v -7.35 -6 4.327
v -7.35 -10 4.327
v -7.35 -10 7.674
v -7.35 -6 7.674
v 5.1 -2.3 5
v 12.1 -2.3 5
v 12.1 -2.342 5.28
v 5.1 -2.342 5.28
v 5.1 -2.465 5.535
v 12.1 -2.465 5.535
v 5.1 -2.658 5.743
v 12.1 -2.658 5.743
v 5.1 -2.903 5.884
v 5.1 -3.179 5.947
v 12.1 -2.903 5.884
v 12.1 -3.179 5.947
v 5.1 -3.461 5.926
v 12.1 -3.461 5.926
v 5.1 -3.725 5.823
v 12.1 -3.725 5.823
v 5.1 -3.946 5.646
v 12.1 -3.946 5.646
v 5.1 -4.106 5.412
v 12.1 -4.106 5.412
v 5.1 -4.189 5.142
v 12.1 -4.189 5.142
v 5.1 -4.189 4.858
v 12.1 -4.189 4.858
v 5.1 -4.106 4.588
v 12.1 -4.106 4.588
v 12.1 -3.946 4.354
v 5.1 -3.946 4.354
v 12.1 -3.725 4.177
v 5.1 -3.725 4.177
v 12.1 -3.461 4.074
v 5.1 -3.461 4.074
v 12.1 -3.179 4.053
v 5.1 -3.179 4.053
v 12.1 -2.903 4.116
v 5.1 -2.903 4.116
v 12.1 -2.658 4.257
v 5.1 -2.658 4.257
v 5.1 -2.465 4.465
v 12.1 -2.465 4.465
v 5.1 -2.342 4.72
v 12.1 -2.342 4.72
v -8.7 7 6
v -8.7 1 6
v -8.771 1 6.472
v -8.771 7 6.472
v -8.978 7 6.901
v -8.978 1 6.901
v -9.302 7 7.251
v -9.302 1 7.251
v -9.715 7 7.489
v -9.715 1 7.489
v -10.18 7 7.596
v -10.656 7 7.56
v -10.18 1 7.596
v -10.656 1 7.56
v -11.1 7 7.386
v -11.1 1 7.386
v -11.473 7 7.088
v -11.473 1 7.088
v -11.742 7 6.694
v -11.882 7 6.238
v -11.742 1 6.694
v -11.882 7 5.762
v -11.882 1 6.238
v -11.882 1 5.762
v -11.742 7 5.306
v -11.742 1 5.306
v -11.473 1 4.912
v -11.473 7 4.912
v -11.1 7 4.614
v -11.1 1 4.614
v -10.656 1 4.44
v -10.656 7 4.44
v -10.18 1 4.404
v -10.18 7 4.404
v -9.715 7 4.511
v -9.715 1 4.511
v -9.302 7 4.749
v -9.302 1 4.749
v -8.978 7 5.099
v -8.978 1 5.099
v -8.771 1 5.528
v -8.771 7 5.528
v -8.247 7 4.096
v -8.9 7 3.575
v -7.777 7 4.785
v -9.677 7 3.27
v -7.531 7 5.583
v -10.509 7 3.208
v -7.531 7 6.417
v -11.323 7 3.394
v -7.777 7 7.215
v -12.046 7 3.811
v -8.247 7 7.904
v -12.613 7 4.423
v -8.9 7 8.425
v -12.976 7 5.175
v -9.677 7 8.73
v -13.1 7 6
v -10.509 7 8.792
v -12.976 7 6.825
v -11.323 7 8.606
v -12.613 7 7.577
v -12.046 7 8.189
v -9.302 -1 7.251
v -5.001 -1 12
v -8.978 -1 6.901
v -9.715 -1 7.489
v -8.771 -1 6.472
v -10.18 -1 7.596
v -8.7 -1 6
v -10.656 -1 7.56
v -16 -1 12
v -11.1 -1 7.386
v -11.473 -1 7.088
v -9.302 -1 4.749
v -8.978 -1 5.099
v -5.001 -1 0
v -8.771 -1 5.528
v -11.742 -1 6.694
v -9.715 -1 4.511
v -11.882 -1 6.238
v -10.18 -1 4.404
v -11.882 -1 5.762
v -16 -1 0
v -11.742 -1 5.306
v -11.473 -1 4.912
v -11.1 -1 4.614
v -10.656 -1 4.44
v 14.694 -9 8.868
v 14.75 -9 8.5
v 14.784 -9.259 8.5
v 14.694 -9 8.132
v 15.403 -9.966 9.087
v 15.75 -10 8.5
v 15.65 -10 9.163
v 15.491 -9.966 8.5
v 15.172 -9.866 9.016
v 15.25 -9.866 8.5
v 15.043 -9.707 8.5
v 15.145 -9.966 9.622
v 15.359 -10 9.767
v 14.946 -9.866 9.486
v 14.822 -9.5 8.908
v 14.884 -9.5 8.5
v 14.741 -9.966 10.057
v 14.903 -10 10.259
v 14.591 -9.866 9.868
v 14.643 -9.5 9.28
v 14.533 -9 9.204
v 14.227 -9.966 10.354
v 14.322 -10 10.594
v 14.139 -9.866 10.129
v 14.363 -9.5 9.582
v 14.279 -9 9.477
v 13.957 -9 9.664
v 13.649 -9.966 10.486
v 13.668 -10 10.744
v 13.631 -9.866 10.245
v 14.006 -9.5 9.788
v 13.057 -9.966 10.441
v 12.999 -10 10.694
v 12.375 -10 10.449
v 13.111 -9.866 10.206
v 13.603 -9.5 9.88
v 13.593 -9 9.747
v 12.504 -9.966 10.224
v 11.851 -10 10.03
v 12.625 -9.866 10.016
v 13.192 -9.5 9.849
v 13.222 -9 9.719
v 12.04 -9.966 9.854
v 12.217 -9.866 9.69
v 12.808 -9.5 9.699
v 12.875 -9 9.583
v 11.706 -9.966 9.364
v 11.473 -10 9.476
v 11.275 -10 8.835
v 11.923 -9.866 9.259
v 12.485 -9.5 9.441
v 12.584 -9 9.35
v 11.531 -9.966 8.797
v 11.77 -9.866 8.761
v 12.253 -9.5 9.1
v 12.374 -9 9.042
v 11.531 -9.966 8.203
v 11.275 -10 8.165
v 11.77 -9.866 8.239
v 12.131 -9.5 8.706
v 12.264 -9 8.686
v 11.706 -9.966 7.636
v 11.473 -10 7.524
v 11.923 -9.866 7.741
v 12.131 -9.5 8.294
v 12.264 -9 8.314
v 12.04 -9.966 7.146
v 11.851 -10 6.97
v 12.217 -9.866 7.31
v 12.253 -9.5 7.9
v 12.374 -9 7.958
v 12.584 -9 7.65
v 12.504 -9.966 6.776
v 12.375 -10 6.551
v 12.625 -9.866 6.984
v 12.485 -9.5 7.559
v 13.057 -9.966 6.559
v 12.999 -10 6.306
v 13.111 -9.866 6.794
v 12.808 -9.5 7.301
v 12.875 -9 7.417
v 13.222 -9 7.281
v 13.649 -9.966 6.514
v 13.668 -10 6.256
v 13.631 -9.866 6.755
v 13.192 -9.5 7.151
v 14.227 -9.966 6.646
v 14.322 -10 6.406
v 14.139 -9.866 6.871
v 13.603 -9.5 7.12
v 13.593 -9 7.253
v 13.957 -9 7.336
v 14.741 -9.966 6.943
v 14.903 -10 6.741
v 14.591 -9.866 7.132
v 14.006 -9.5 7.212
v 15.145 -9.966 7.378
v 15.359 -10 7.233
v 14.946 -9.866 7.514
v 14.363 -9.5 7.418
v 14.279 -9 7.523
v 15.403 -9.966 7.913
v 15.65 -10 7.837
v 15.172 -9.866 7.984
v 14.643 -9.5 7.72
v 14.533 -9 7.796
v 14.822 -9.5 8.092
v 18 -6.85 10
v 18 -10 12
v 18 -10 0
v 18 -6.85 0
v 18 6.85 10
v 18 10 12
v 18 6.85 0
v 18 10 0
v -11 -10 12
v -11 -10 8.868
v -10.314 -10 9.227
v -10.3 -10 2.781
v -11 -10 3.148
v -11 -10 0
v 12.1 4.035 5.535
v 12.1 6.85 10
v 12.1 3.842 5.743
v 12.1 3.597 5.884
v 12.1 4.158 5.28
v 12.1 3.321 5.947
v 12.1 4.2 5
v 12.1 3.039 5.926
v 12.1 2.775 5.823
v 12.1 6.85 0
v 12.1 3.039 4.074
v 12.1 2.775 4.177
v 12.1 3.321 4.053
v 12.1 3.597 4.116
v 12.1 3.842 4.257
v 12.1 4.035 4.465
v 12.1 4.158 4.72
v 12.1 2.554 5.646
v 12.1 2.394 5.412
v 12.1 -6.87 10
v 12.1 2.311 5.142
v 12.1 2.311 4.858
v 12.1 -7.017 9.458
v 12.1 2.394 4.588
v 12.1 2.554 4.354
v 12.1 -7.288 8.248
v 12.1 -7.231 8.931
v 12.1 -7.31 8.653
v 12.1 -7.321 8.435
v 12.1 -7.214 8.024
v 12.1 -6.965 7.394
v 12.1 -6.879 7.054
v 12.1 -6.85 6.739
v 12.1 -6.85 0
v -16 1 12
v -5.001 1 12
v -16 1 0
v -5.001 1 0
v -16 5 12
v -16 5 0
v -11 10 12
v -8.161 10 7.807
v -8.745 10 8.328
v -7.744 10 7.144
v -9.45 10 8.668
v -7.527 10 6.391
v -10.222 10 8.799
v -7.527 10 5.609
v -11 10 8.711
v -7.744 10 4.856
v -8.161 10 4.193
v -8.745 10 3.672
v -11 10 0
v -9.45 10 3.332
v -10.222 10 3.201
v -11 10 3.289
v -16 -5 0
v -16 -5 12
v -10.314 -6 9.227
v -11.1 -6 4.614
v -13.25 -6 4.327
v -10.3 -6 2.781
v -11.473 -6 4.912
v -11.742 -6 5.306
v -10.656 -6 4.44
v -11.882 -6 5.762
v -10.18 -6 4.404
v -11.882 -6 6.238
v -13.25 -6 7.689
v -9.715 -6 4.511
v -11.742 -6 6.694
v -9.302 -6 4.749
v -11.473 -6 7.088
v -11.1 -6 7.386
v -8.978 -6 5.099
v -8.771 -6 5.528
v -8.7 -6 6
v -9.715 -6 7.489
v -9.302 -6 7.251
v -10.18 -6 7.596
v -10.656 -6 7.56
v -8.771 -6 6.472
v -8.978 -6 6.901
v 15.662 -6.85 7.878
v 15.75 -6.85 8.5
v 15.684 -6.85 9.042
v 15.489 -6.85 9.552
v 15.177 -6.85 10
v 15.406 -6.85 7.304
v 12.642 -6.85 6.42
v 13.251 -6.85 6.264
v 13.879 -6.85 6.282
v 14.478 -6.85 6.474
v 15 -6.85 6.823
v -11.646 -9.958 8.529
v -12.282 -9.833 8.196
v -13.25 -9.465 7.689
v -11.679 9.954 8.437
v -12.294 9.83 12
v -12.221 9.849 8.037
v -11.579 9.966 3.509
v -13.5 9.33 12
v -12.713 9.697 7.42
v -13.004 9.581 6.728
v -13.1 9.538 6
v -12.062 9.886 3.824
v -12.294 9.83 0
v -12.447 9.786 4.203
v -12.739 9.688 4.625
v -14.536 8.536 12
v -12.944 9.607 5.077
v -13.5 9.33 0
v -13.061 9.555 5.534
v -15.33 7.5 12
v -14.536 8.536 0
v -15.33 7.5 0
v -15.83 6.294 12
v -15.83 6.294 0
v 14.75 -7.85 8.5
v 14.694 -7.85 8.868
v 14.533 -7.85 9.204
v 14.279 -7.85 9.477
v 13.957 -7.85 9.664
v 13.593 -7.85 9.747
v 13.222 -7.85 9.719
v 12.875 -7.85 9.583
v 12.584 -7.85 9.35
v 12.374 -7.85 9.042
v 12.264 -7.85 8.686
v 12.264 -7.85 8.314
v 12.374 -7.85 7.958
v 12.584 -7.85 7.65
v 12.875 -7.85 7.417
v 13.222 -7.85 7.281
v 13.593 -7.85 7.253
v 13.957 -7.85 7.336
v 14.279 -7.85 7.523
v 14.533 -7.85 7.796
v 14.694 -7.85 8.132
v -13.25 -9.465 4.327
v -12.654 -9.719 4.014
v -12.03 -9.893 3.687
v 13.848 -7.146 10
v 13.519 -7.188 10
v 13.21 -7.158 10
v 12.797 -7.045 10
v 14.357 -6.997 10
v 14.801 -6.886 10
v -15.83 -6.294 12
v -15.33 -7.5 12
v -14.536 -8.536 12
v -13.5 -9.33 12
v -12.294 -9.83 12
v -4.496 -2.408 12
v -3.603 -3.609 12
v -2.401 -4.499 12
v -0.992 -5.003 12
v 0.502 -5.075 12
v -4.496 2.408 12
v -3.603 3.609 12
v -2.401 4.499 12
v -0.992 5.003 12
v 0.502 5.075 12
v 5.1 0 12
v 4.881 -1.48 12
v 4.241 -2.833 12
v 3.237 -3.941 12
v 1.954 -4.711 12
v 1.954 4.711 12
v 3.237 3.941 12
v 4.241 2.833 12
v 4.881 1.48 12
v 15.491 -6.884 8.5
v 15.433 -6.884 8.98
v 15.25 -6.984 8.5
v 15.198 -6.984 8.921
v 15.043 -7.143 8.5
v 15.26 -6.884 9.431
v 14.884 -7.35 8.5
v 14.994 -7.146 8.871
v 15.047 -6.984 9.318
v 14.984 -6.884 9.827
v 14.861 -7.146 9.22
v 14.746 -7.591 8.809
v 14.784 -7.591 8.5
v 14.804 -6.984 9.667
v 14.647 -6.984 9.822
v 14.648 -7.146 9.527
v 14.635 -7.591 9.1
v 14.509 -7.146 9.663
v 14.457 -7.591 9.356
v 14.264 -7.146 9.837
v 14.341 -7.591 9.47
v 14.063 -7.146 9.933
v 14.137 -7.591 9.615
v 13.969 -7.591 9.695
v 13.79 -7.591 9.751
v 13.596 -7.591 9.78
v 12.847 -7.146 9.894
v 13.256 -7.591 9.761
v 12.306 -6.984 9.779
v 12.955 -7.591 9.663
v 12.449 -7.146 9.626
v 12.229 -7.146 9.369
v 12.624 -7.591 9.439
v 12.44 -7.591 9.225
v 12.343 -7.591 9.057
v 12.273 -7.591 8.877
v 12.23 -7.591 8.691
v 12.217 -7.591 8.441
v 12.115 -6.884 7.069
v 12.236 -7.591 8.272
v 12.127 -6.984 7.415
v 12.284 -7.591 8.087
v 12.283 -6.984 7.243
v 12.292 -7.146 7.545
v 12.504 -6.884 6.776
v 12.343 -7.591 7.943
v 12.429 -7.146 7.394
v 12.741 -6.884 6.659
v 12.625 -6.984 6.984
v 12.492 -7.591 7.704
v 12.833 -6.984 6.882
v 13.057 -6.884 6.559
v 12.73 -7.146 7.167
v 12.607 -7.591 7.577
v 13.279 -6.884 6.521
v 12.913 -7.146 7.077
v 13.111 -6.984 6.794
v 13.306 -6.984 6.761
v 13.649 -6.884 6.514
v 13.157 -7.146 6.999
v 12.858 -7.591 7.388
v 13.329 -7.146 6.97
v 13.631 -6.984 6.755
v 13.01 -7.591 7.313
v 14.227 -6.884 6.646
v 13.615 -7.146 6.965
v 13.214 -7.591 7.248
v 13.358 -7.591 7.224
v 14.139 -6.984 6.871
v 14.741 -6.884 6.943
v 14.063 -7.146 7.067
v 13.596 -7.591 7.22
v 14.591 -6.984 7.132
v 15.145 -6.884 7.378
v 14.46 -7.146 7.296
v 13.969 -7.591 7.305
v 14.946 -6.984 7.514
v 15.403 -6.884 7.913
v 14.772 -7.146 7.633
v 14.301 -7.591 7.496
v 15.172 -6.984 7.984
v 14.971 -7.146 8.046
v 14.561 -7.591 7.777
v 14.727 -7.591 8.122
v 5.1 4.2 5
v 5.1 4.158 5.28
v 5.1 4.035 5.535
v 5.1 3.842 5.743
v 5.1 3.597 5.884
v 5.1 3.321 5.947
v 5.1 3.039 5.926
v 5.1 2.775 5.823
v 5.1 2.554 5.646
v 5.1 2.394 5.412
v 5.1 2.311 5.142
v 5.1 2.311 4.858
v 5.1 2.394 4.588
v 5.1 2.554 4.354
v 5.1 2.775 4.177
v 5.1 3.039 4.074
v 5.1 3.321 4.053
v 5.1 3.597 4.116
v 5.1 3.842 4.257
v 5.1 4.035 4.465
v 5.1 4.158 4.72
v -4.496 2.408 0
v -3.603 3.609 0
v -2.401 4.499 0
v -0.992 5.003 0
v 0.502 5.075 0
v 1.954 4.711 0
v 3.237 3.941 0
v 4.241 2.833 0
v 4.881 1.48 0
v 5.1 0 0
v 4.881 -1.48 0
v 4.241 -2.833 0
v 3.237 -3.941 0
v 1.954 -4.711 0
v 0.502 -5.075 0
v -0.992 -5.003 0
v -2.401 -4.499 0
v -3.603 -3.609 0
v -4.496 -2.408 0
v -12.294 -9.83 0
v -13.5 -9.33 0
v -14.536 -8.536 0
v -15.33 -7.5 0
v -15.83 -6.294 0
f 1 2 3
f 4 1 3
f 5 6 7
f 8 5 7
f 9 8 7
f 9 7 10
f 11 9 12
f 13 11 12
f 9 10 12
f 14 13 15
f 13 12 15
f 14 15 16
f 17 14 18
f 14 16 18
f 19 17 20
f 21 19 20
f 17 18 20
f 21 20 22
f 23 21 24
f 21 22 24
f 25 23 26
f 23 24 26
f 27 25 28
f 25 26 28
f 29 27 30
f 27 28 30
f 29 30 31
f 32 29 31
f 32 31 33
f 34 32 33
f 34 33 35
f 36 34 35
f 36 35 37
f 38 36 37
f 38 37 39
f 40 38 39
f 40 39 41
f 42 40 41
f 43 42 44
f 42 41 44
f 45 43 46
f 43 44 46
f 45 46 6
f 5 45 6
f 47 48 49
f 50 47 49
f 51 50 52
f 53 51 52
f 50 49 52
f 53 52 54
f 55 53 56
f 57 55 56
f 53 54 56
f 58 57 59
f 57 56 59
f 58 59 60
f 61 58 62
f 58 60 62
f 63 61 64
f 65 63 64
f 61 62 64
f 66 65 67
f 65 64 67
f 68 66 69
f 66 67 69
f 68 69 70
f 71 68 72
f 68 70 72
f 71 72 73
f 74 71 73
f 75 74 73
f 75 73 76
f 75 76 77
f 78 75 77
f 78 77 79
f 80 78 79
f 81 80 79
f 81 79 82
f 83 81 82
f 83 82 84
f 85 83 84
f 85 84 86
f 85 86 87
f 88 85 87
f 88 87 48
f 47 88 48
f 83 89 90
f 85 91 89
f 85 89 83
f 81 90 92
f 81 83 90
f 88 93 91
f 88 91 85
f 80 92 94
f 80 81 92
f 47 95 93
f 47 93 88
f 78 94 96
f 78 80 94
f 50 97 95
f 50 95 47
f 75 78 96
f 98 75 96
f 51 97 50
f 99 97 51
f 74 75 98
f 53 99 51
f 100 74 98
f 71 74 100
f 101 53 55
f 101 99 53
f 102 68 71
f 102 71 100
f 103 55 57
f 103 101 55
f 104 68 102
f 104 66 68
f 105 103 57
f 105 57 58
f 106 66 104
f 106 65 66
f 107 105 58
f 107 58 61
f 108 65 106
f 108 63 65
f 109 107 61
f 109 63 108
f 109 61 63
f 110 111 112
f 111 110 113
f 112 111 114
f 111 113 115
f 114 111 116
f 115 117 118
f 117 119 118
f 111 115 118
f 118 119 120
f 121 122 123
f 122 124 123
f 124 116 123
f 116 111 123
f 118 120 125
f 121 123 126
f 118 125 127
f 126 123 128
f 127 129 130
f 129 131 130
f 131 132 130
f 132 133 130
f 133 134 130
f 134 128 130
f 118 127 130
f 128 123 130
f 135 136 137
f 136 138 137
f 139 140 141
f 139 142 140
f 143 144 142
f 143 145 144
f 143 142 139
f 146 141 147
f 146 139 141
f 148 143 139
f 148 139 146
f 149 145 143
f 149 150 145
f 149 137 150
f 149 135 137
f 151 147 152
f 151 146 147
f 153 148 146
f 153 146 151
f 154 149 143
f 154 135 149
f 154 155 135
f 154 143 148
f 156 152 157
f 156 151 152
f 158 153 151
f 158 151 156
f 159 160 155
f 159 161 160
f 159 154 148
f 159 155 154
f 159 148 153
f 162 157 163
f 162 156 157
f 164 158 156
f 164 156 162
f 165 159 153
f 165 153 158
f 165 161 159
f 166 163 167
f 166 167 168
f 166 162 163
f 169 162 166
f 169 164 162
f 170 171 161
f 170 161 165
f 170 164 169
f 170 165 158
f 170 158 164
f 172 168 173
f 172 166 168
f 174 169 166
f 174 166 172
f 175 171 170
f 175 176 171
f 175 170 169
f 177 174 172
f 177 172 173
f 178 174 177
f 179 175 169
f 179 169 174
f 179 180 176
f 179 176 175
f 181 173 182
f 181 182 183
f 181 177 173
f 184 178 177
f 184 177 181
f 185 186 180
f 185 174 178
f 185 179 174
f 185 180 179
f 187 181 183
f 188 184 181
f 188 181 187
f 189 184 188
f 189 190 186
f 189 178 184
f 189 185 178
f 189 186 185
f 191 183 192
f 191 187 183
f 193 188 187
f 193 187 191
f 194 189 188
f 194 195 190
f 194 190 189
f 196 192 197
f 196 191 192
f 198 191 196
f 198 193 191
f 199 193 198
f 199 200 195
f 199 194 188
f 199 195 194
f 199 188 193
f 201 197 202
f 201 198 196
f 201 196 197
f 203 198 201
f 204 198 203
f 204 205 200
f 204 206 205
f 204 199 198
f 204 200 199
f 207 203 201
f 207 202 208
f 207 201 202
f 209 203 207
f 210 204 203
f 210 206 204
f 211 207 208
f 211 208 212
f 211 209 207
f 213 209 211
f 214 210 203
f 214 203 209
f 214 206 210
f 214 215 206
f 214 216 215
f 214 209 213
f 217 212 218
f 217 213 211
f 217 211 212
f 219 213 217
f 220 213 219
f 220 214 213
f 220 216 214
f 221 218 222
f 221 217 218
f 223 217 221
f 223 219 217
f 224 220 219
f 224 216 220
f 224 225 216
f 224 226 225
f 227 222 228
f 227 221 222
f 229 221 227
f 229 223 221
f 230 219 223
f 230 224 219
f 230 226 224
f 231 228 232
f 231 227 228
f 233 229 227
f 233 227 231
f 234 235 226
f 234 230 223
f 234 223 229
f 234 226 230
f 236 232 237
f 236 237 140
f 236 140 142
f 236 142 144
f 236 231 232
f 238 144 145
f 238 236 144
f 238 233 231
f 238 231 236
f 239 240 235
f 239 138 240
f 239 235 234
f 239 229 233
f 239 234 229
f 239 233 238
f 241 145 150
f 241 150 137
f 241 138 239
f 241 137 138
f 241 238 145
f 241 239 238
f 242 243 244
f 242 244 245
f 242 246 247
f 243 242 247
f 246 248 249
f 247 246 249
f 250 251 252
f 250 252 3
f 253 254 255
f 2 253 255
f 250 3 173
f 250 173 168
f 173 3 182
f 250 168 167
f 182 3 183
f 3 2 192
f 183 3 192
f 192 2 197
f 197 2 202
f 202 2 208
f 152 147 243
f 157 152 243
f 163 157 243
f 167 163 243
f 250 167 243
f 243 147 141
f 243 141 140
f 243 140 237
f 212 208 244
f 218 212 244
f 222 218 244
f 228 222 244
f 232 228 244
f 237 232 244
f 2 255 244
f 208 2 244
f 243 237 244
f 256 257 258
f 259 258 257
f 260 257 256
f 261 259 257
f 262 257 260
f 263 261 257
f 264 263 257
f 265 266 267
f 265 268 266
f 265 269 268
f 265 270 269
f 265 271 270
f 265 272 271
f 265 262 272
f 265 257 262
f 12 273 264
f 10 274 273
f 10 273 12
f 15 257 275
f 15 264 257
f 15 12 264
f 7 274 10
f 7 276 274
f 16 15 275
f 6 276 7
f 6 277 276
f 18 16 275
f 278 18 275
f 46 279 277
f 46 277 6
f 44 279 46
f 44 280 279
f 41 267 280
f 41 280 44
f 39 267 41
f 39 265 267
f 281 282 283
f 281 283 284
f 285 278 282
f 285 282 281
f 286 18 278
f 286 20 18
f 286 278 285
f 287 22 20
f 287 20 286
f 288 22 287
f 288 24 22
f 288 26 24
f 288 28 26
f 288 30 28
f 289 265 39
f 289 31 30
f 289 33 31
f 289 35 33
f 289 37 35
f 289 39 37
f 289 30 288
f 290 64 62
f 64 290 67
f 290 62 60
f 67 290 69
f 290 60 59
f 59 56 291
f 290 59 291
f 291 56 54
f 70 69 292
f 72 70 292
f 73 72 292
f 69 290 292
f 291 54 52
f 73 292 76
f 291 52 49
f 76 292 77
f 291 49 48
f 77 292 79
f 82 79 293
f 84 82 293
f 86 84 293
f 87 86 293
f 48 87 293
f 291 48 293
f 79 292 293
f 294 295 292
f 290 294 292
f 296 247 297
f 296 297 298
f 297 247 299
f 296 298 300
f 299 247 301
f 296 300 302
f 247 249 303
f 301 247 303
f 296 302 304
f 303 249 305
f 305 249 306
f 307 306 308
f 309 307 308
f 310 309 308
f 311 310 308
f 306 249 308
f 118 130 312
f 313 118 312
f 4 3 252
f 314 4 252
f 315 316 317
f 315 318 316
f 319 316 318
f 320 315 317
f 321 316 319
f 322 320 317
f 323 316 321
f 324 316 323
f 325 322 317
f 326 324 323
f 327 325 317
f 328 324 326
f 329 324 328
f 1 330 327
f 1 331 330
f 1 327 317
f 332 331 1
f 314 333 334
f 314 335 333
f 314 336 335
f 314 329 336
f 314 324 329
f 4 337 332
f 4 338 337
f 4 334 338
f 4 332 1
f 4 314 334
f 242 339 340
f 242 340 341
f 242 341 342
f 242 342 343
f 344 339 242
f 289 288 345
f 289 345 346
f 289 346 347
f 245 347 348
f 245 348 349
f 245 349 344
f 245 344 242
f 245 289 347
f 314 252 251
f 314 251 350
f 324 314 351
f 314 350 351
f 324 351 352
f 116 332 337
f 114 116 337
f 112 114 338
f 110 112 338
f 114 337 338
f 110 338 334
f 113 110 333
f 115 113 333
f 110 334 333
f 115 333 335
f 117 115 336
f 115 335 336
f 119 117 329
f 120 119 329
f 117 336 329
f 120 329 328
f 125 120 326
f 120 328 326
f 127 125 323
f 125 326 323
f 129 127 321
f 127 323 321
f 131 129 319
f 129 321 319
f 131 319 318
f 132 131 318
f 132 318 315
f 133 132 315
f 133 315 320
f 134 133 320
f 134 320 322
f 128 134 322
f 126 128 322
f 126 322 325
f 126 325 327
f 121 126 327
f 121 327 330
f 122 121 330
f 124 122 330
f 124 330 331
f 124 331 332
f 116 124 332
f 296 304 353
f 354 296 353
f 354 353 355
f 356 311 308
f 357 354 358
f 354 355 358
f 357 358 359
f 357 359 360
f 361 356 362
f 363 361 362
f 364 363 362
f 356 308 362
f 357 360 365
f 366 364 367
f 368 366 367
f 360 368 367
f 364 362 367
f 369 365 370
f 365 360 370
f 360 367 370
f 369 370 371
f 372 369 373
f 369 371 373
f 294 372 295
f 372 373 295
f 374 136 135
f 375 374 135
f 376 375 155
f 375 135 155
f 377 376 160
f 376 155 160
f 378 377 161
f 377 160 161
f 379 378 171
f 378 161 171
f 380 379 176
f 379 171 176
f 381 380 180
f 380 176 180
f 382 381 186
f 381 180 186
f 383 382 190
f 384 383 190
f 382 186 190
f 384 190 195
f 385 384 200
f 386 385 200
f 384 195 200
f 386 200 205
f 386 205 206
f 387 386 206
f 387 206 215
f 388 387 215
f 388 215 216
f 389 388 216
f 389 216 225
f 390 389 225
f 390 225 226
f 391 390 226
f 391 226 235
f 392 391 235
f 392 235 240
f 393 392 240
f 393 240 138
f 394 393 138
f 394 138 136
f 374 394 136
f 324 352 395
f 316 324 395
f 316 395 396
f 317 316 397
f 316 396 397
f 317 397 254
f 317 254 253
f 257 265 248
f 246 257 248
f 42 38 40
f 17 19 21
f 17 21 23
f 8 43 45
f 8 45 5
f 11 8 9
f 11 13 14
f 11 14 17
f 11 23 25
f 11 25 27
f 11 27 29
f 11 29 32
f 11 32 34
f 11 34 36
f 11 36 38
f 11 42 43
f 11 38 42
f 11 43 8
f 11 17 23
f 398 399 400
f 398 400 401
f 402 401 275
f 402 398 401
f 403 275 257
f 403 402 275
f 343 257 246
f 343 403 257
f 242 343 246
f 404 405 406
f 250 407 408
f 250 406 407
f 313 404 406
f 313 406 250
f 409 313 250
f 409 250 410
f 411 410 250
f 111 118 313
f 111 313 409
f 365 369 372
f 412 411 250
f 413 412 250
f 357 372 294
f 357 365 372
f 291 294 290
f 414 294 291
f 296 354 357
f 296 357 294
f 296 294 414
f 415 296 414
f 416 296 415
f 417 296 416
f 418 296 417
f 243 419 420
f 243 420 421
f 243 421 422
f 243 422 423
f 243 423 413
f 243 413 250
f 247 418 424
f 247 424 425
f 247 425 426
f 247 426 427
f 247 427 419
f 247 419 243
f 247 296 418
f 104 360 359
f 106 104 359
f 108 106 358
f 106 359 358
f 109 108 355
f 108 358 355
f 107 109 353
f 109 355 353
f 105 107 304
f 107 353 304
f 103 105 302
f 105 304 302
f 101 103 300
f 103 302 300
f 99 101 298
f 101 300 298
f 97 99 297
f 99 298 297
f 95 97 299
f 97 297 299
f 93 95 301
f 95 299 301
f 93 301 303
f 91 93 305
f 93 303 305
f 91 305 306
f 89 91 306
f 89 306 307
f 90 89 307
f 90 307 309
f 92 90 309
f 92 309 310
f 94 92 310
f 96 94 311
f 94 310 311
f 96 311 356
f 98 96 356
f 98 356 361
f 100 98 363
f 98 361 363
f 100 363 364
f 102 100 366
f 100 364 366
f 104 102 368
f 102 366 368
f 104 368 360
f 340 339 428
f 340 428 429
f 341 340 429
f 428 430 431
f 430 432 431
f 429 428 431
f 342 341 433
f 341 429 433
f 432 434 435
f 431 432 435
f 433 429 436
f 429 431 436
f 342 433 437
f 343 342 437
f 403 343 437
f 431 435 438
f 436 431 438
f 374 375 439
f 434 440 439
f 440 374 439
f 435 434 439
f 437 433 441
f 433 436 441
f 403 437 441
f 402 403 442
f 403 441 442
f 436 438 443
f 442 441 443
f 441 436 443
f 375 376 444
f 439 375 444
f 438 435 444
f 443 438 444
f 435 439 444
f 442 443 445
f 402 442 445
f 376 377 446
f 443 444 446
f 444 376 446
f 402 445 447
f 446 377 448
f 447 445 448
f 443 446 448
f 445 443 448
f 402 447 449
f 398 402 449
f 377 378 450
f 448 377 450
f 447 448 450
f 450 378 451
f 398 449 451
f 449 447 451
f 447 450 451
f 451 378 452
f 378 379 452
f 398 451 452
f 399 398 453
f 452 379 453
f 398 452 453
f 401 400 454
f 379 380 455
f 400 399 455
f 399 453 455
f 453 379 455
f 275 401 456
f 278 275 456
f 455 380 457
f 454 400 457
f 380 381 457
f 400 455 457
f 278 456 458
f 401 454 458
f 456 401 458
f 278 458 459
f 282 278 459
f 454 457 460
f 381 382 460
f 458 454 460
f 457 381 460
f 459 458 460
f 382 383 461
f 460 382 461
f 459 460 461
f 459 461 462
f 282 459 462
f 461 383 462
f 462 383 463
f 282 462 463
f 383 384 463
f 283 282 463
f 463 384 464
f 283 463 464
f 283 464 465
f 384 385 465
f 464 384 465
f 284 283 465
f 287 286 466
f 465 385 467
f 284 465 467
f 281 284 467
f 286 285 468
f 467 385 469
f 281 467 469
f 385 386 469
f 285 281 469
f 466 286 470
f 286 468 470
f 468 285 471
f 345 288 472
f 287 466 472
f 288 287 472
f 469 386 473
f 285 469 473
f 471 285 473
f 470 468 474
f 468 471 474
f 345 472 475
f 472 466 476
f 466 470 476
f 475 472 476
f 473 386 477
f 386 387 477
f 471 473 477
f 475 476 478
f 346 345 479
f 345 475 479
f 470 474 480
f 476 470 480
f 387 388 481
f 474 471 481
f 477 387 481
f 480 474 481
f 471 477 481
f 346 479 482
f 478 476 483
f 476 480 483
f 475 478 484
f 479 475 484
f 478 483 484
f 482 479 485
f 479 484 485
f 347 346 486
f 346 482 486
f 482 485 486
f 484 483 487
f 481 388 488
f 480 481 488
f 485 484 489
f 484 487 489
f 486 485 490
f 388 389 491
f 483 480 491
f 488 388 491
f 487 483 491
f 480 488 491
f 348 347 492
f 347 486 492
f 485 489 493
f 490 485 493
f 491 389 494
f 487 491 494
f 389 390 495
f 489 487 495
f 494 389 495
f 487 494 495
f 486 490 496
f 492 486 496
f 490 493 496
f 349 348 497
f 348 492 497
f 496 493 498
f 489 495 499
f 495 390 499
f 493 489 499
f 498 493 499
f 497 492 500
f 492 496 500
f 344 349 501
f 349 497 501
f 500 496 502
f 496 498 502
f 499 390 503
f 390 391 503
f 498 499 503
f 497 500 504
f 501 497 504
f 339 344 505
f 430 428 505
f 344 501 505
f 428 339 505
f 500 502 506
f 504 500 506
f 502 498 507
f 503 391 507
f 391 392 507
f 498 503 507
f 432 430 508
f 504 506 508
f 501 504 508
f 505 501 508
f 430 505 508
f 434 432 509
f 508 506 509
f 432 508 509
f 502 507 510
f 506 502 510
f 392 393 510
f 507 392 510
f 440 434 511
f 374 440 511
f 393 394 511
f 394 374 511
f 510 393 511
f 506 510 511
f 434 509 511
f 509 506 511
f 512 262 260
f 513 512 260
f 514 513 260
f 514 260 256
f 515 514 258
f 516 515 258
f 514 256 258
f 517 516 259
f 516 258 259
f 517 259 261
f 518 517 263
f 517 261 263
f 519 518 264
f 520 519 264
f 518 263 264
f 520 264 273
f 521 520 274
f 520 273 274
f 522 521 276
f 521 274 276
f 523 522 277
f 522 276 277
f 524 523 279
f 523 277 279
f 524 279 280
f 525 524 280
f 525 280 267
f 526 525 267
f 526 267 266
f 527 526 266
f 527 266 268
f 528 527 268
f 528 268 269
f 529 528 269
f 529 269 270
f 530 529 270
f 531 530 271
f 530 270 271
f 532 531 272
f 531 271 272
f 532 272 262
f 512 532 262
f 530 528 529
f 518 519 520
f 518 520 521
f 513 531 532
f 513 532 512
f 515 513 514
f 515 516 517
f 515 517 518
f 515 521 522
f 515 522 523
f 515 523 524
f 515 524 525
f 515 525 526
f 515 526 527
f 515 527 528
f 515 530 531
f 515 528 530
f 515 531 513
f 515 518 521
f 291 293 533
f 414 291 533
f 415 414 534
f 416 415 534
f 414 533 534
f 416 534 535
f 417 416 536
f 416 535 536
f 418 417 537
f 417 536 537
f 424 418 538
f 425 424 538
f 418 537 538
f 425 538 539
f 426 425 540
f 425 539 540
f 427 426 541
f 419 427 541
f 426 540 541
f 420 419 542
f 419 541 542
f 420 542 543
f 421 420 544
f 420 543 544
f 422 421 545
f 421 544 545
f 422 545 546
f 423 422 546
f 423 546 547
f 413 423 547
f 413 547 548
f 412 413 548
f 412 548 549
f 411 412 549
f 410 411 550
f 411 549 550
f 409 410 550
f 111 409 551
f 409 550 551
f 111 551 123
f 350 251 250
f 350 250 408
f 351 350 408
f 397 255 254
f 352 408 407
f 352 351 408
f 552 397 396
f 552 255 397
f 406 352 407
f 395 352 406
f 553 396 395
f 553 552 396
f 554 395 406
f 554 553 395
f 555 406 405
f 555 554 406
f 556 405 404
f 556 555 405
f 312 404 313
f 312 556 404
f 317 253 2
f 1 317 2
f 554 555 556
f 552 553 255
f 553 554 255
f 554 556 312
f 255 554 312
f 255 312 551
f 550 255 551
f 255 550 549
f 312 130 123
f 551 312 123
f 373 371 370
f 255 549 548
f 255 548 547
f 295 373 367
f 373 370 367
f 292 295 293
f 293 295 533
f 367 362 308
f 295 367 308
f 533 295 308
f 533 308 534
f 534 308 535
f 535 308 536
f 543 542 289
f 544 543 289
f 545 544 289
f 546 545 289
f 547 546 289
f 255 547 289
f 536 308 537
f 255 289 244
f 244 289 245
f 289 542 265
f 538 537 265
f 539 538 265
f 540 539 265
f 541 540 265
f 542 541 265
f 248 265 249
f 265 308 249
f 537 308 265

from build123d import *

# Parameters (mm, degrees)
F1_DEPTH     = 12
F2_W         = 5.9
F2_H         = 13.7
F3_DEPTH     = 10
F4_R         = 1.6
F5_DEPTH     = 20.001
F6_R         = 1.25
F7_DEPTH     = 16
F9_R         = 0.95
F10_DEPTH    = 7
F11_R        = 1.6
F12_DEPTH    = 4
F13_R        = 2.8
F14_DEPTH    = 3
F15_T1_DEPTH = 37


# Not quite as in the source:
# - a fillet or chamfer that OpenCascade refuses, or shapes differently, is made with other operations: its cross-section is extruded or revolved along the edge and cut away or added


with BuildPart() as f1:
    # F0 (on Top) → F1 (new body)
    with BuildSketch(Plane.XY):
        with BuildLine():
            Line((18, 10), (-16, 10))
            Line((-16, 10), (-16, 1))
            Line((-16, 1), (-5.0009999, 1))
            ThreePointArc((-5.0009999, 1), (5.1, 0), (-5.0009999, -1))
            Line((-5.0009999, -1), (-16, -1))
            Line((-16, -1), (-16, -10))
            Line((-16, -10), (18, -10))
            Line((18, -10), (18, -6.85))
            Line((18, -6.85), (18, 6.85))
            Line((18, 6.85), (18, 10))
        make_face()
    extrude(amount=F1_DEPTH)

    # F2 (on face) → F3 (cut)
    with BuildSketch(Plane(origin=(0, 0, 0), x_dir=(1, 0, 0), z_dir=(0, 0, -1))):
        with Locations((15.05, 0)):
            Rectangle(F2_W, F2_H)
    extrude(amount=-F3_DEPTH, mode=Mode.SUBTRACT)

    # F4 (on face) → F5 (cut, through all)
    with BuildSketch(Plane.XZ.offset(10)):
        with Locations((-10.3, 6)):
            Circle(F4_R)
    extrude(amount=-F5_DEPTH, mode=Mode.SUBTRACT)

    # F6 (on face) → F7 (cut)
    with BuildSketch(Plane.XZ.offset(10)):
        with Locations((13.5, 8.5)):
            Circle(F6_R)
    extrude(amount=-F7_DEPTH, mode=Mode.SUBTRACT)

    # F8: fillet of radius 1 on 2 edges, made by hand

    # F8_s1 → F8_t2 (revolve, cut)
    with BuildSketch(Plane.XY.offset(8.5)):
        with BuildLine():
            ThreePointArc((15.75, -10), (15.0428932188, -9.7071067812), (14.75, -9))
            Line((14.75, -9), (14.75, -10))
            Line((14.75, -10), (15.75, -10))
        make_face()
    revolve(axis=Axis((13.5, -10, 8.5), (0, -1, 0)), mode=Mode.SUBTRACT)


with BuildPart() as f8_tool4:
    # F8_s5 → F8_t6 (revolve)
    with BuildSketch(Plane.XY.offset(8.5)):
        with BuildLine():
            ThreePointArc((15.75, -6.85), (15.0428932188, -7.1428932188), (14.75, -7.85))
            Line((14.75, -7.85), (14.75, -6.85))
            Line((14.75, -6.85), (15.75, -6.85))
        make_face()
    revolve(axis=Axis((13.5, -6.85, 8.5), (0, -1, 0)))

    split(bisect_by=Plane.XY.offset(10), keep=Keep.BOTTOM)

    split(bisect_by=Plane.YZ.offset(12.1), keep=Keep.TOP)


with BuildPart() as f1_1:
    add(f1.part)

    # F8_t3: cut F8_tool4
    add(f8_tool4.part, mode=Mode.SUBTRACT)

    # F9 (on face) → F10 (cut)
    with BuildSketch(Plane.YZ.offset(12.1)):
        with Locations((46.374425292, 0.8309943862)):
            Circle(F9_R)
        with Locations((46.374425292, -5.6690056138)):
            Circle(F9_R)
        with Locations((-3.25, 5)):
            Circle(F9_R)
        with Locations((3.25, 5)):
            Circle(F9_R)
    extrude(amount=-F10_DEPTH, mode=Mode.SUBTRACT)

    # F11 (on face) → F12 (cut)
    with BuildSketch(Plane.XZ.offset(10)):
        Polygon((-7.35, 7.6736242323), (-10.3143082515, 9.227305642), (-13.25, 7.6886229858), (-13.25, 4.3268273558), (-10.3, 2.7806453228), (-7.35, 4.3268273558), align=None)
        with Locations((-10.3, 6)):
            Circle(F11_R, mode=Mode.SUBTRACT)
    extrude(amount=-F12_DEPTH, mode=Mode.SUBTRACT)

    # F13 (on face) → F14 (cut)
    with BuildSketch(Plane(origin=(0, 10, 0), x_dir=(-1, 0, 0), z_dir=(0, 1, 0))):
        with Locations((10.3, 6)):
            Circle(F13_R)
    extrude(amount=-F14_DEPTH, mode=Mode.SUBTRACT)

    # F15: fillet of radius 5 on 2 edges, made by hand

    # F15_s2 → F15_t1 (cut)
    with BuildSketch(Plane.XY.offset(-12.5)):
        with BuildLine():
            ThreePointArc((-11, -10), (-14.5355339059, -8.5355339059), (-16, -5))
            Line((-16, -5), (-16, -10))
            Line((-16, -10), (-11, -10))
        make_face()
        with BuildLine():
            ThreePointArc((-11, 10), (-14.5355339059, 8.5355339059), (-16, 5))
            Line((-16, 5), (-16, 10))
            Line((-16, 10), (-11, 10))
        make_face()
    extrude(amount=F15_T1_DEPTH, mode=Mode.SUBTRACT)


solid = f1_1.part
